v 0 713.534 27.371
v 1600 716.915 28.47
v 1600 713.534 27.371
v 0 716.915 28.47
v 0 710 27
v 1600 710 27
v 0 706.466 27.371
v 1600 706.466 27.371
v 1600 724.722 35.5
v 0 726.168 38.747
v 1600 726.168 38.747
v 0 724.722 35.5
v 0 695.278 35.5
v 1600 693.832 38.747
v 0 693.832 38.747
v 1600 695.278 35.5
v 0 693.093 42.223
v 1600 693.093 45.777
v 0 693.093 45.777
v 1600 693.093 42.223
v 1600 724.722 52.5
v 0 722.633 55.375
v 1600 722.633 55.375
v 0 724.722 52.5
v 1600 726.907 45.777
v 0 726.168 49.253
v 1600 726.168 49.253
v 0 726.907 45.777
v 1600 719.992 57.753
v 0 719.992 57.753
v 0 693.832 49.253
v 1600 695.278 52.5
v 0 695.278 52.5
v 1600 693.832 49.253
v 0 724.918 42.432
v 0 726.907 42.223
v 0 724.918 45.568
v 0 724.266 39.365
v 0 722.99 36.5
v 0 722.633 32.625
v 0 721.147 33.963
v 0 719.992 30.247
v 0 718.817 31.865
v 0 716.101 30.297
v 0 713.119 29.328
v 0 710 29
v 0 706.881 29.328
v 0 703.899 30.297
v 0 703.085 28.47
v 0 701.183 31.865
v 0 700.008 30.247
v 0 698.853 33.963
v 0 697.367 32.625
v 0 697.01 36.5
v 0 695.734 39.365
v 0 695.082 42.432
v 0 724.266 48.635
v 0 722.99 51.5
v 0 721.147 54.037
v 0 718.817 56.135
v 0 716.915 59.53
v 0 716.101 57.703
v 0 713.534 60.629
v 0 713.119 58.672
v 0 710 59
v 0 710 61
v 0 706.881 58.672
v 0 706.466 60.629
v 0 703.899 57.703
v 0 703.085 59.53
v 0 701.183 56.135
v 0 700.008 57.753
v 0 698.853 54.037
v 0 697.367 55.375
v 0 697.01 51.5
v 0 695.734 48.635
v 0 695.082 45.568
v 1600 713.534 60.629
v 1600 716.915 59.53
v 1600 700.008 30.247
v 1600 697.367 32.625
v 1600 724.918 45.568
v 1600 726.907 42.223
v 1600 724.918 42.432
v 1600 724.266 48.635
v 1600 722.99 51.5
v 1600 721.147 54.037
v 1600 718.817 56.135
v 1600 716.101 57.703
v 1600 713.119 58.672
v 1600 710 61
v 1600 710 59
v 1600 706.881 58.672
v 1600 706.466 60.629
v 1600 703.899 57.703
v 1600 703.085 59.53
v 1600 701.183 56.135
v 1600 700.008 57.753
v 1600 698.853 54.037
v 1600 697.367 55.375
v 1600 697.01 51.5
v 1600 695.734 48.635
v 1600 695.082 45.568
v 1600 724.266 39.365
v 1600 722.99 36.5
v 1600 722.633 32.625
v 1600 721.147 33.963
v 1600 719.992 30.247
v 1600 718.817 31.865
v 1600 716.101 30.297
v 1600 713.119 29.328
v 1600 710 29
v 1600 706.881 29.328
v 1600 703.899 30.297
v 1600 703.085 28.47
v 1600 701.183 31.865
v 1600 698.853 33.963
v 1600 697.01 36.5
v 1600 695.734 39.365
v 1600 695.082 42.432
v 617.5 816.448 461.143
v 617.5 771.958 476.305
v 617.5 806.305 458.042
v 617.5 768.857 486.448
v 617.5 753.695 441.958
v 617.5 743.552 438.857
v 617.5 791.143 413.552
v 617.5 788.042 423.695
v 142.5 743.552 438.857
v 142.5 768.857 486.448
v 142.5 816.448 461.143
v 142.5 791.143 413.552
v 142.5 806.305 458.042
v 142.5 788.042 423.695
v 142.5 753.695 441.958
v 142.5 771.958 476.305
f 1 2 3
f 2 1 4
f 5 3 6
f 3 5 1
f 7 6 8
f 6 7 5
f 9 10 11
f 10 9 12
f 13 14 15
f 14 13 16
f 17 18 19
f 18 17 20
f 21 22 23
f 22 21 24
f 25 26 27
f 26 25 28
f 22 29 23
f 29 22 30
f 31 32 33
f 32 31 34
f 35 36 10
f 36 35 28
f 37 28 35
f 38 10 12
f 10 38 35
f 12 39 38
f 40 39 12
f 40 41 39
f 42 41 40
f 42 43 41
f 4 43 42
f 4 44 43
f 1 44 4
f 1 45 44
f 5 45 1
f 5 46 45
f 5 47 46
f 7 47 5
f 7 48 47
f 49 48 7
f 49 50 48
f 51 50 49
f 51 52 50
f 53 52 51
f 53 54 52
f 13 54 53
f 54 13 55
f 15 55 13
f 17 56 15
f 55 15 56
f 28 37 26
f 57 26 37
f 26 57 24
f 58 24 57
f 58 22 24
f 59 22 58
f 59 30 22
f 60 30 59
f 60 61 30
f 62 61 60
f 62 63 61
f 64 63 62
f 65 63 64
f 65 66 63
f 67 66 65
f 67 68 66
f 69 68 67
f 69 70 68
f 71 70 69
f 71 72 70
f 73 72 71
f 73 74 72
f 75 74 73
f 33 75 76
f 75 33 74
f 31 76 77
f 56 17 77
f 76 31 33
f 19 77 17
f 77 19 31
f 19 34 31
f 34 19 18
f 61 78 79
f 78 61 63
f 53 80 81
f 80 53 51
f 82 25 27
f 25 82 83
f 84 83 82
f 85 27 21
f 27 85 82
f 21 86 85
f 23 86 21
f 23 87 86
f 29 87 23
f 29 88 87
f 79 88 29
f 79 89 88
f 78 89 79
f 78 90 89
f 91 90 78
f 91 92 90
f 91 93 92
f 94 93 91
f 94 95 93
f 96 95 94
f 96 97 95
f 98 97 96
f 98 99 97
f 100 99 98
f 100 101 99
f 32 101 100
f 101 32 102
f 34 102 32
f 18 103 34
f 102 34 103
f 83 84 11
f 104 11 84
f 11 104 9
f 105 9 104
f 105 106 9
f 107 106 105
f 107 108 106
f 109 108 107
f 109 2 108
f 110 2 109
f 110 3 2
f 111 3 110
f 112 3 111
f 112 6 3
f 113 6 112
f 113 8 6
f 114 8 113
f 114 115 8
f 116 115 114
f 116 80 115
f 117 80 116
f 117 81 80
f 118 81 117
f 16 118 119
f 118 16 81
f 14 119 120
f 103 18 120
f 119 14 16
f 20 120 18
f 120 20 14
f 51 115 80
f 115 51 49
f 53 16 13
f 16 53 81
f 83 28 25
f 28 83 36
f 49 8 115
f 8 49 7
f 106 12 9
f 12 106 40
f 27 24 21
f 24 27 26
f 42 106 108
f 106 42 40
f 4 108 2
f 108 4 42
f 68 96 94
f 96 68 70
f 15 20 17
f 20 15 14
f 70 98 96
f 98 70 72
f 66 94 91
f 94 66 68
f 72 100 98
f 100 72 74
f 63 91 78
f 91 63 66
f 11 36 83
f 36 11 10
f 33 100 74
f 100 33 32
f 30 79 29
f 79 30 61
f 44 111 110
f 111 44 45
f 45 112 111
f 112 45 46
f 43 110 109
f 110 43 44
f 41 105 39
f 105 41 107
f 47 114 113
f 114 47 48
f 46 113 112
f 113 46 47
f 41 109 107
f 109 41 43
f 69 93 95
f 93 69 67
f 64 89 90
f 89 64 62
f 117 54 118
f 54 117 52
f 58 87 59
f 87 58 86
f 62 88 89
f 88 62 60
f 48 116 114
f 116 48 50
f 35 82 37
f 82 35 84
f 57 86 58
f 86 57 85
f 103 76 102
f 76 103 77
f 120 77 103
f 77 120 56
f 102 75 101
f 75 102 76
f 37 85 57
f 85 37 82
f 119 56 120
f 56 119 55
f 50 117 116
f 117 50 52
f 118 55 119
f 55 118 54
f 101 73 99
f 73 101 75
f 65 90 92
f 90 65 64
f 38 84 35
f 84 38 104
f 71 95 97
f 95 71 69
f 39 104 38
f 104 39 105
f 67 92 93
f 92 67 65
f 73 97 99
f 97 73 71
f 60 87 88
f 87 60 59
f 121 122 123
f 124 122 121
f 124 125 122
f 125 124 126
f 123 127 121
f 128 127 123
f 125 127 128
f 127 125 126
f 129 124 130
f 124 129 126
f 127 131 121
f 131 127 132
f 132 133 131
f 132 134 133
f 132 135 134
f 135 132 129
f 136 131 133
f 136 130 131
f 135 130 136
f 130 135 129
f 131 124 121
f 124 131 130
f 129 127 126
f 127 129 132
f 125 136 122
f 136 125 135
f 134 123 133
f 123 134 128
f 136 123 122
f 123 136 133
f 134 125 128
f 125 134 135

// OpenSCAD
/* Tynes Subassemblies parameters*/
l=1600;
tynes_num=10;
sq_tb= 3;// inches;
sh_thick=10;

d_b_tynes=l/tynes_num;


/*Lead Parameters*/
l_lid=500;
l_ratio=(l_lid-l_lid*0.07)/450;

/* Tynes Assembly
- [x] In Out Gussets for out tynes
- [x] In gussets for inside tynes

*/
module tynes(){
color("red"){
translate([-sh_thick,0,0])rotate([0,90,0])linear_extrude(center=true,  height = sh_thick)import (file = "ingussets.dxf");

}

translate([-410,100,25])
rotate([0,90,-30])linear_extrude(center=true,  height = sh_thick)import (file = "gussets.dxf");

rotate([0,90,0])linear_extrude(center=true,  height = sh_thick)import (file = "outsidetine.dxf");

}

/* tynes(); */
/*Support Assembly
- [] mount cylinder base 01
- [] ssqa_module
- [] hinch 01
- [] Bussings for Cylinder 01
- [] Bushings for Cylinder 02
- [] pin 1
- [] pin 2
- [] Support plate on to of square tubing
*/

module hinch(){
rotate([0,90,0])linear_extrude(center=true,  height = sh_thick)import(file="hinch.dxf");

}

module mount_cylinder(){
		for (i=[0:4]) {
		translate([i*(sh_thick+sh_thick*0.1)-sh_thick*2, 0, 0])rotate([0,90,0])linear_extrude(center=true,  height = sh_thick)import(file="mount_cylinder.dxf");
	}

}

// Square tube
module sq_tube(length,size){
	/* difference() {
		cube([l,sq_tb*(24.5),sq_tb*(24.5)], center=true);
		cube(size=[l+l*0.2, sq_tb*(24.5)-15, sq_tb*(24.5)-15], center=true);
 	} */

	difference(length,size) {
		cube([length,size*24.5,size*24.5], center=true);
		cube([length+length*0.2, size*(24.5)-15, size*(24.5)-15], center=true);
	}
}


module in_tynes(){
	rotate([0,90,0])
	linear_extrude(center=true,  height = sh_thick)
	import(file="insidetine.dxf");
	color("red"){
	translate([-sh_thick,0,0])rotate([0,90,0])linear_extrude(center=true,  height = sh_thick)import (file = "ingussets.dxf");
	translate([sh_thick,0,0])rotate([0,90,0])linear_extrude(center=true,  height = sh_thick)import (file = "ingussets.dxf");

	translate([415,115,30])
	rotate([0,90,30])linear_extrude(center=true,  height = sh_thick)import (file = "gussets.dxf");
	mirror([1,0,0]){
	translate([405,115,30])
	rotate([0,90,30])linear_extrude(center=true,  height = sh_thick)import (file = "gussets.dxf");
	}
	}
}

/* in_tynes(); */

translate([l/2,710,44])
color("white")
rotate([0,90,0])
difference(){
	cylinder(r=17, h=l, center=true);
	cylinder(r=15, h=l+l*0.2, center=true);
}

module integration(){
// Square tube bottom
translate([-sh_thick*2,-20,40]){
translate([sh_thick*2+l/2,0,50])rotate([75,0,0])color("yellow")
// Squre tube top
sq_tube(l,3);

for (i=[0:1]) {
	translate([i*l/2,0,0]){
	color("green"){
	rotate([-15,0,0])translate([l/2/2+l_lid/2,-55,420])hinch();
	rotate([-15,0,0])translate([l/2/2-l_lid/2,-55,420])hinch();
	rotate([-15,0,0])translate([l/2/2,-55,420])mount_cylinder();
	}
	}
}


translate([sh_thick*2+l/2,105,450])rotate([75,0,0])color("blue")
sq_tube(l,3);
}

translate([d_b_tynes,0,0])for (i=[0:tynes_num-2])
   translate([i*d_b_tynes,0,0])
	 // Replace this by a module
     /* rotate([0,90,0])linear_extrude(center=true,  height = sh_thick)import(file="insidetine.dxf"); */
		 in_tynes();

translate([l,0,0])tynes();
mirror([1, 0, 0]) {
	translate([0,0,0])
	tynes();
	}
}

/* integration(); */


/*Lids subassembly*/
module lids(){
/* - [] thickness space, coupling connection
*/
module lid_plate(){
translate([0,0,700])rotate([0,90,0])linear_extrude(center=true,  height = sh_thick)import (file = "lid_plate.dxf");
}
translate([l_lid/2-sh_thick*1.3,0,0])
lid_plate();
mirror(){
	translate([l_lid/2-sh_thick*1.3,0,0])
	lid_plate();
	}
}

module up_plate(){
	linear_extrude(height = sh_thick)import (file = "brace_plate_lid_upper.dxf");
}

module front_plate(){
	linear_extrude(height = 10)
	import (file = "brace_plate_lid_front.dxf");
}

module lid_jaw(){
	linear_extrude(height = 10, center=true)
	import (file = "lid_jaw.dxf", center=true);
}

color("yellow"){
/*lids subassembly
- [x] lid jaw
- [] busshings
- [] cylinder back
- [] cyinder front
*/
translate([l/4.25,880,-220])
rotate([0,90,90])
scale([1,l_ratio,1])
lid_jaw();

translate([l/4.25,181,-155])
lids();

translate([l/4.25,205,540])
rotate([-6, 0, 0])
rotate([0,0,90])
scale([1,l_ratio,1])
up_plate();

translate([l/4.25,865,210])
rotate([-77,0,0])
rotate([0,0,270])
scale([1,l_ratio,1])
front_plate();


translate([l/4-l/4*0.05,780,450])
rotate([62,0,0])
sq_tube(l_lid-l_lid*0.05,2.2);

}
